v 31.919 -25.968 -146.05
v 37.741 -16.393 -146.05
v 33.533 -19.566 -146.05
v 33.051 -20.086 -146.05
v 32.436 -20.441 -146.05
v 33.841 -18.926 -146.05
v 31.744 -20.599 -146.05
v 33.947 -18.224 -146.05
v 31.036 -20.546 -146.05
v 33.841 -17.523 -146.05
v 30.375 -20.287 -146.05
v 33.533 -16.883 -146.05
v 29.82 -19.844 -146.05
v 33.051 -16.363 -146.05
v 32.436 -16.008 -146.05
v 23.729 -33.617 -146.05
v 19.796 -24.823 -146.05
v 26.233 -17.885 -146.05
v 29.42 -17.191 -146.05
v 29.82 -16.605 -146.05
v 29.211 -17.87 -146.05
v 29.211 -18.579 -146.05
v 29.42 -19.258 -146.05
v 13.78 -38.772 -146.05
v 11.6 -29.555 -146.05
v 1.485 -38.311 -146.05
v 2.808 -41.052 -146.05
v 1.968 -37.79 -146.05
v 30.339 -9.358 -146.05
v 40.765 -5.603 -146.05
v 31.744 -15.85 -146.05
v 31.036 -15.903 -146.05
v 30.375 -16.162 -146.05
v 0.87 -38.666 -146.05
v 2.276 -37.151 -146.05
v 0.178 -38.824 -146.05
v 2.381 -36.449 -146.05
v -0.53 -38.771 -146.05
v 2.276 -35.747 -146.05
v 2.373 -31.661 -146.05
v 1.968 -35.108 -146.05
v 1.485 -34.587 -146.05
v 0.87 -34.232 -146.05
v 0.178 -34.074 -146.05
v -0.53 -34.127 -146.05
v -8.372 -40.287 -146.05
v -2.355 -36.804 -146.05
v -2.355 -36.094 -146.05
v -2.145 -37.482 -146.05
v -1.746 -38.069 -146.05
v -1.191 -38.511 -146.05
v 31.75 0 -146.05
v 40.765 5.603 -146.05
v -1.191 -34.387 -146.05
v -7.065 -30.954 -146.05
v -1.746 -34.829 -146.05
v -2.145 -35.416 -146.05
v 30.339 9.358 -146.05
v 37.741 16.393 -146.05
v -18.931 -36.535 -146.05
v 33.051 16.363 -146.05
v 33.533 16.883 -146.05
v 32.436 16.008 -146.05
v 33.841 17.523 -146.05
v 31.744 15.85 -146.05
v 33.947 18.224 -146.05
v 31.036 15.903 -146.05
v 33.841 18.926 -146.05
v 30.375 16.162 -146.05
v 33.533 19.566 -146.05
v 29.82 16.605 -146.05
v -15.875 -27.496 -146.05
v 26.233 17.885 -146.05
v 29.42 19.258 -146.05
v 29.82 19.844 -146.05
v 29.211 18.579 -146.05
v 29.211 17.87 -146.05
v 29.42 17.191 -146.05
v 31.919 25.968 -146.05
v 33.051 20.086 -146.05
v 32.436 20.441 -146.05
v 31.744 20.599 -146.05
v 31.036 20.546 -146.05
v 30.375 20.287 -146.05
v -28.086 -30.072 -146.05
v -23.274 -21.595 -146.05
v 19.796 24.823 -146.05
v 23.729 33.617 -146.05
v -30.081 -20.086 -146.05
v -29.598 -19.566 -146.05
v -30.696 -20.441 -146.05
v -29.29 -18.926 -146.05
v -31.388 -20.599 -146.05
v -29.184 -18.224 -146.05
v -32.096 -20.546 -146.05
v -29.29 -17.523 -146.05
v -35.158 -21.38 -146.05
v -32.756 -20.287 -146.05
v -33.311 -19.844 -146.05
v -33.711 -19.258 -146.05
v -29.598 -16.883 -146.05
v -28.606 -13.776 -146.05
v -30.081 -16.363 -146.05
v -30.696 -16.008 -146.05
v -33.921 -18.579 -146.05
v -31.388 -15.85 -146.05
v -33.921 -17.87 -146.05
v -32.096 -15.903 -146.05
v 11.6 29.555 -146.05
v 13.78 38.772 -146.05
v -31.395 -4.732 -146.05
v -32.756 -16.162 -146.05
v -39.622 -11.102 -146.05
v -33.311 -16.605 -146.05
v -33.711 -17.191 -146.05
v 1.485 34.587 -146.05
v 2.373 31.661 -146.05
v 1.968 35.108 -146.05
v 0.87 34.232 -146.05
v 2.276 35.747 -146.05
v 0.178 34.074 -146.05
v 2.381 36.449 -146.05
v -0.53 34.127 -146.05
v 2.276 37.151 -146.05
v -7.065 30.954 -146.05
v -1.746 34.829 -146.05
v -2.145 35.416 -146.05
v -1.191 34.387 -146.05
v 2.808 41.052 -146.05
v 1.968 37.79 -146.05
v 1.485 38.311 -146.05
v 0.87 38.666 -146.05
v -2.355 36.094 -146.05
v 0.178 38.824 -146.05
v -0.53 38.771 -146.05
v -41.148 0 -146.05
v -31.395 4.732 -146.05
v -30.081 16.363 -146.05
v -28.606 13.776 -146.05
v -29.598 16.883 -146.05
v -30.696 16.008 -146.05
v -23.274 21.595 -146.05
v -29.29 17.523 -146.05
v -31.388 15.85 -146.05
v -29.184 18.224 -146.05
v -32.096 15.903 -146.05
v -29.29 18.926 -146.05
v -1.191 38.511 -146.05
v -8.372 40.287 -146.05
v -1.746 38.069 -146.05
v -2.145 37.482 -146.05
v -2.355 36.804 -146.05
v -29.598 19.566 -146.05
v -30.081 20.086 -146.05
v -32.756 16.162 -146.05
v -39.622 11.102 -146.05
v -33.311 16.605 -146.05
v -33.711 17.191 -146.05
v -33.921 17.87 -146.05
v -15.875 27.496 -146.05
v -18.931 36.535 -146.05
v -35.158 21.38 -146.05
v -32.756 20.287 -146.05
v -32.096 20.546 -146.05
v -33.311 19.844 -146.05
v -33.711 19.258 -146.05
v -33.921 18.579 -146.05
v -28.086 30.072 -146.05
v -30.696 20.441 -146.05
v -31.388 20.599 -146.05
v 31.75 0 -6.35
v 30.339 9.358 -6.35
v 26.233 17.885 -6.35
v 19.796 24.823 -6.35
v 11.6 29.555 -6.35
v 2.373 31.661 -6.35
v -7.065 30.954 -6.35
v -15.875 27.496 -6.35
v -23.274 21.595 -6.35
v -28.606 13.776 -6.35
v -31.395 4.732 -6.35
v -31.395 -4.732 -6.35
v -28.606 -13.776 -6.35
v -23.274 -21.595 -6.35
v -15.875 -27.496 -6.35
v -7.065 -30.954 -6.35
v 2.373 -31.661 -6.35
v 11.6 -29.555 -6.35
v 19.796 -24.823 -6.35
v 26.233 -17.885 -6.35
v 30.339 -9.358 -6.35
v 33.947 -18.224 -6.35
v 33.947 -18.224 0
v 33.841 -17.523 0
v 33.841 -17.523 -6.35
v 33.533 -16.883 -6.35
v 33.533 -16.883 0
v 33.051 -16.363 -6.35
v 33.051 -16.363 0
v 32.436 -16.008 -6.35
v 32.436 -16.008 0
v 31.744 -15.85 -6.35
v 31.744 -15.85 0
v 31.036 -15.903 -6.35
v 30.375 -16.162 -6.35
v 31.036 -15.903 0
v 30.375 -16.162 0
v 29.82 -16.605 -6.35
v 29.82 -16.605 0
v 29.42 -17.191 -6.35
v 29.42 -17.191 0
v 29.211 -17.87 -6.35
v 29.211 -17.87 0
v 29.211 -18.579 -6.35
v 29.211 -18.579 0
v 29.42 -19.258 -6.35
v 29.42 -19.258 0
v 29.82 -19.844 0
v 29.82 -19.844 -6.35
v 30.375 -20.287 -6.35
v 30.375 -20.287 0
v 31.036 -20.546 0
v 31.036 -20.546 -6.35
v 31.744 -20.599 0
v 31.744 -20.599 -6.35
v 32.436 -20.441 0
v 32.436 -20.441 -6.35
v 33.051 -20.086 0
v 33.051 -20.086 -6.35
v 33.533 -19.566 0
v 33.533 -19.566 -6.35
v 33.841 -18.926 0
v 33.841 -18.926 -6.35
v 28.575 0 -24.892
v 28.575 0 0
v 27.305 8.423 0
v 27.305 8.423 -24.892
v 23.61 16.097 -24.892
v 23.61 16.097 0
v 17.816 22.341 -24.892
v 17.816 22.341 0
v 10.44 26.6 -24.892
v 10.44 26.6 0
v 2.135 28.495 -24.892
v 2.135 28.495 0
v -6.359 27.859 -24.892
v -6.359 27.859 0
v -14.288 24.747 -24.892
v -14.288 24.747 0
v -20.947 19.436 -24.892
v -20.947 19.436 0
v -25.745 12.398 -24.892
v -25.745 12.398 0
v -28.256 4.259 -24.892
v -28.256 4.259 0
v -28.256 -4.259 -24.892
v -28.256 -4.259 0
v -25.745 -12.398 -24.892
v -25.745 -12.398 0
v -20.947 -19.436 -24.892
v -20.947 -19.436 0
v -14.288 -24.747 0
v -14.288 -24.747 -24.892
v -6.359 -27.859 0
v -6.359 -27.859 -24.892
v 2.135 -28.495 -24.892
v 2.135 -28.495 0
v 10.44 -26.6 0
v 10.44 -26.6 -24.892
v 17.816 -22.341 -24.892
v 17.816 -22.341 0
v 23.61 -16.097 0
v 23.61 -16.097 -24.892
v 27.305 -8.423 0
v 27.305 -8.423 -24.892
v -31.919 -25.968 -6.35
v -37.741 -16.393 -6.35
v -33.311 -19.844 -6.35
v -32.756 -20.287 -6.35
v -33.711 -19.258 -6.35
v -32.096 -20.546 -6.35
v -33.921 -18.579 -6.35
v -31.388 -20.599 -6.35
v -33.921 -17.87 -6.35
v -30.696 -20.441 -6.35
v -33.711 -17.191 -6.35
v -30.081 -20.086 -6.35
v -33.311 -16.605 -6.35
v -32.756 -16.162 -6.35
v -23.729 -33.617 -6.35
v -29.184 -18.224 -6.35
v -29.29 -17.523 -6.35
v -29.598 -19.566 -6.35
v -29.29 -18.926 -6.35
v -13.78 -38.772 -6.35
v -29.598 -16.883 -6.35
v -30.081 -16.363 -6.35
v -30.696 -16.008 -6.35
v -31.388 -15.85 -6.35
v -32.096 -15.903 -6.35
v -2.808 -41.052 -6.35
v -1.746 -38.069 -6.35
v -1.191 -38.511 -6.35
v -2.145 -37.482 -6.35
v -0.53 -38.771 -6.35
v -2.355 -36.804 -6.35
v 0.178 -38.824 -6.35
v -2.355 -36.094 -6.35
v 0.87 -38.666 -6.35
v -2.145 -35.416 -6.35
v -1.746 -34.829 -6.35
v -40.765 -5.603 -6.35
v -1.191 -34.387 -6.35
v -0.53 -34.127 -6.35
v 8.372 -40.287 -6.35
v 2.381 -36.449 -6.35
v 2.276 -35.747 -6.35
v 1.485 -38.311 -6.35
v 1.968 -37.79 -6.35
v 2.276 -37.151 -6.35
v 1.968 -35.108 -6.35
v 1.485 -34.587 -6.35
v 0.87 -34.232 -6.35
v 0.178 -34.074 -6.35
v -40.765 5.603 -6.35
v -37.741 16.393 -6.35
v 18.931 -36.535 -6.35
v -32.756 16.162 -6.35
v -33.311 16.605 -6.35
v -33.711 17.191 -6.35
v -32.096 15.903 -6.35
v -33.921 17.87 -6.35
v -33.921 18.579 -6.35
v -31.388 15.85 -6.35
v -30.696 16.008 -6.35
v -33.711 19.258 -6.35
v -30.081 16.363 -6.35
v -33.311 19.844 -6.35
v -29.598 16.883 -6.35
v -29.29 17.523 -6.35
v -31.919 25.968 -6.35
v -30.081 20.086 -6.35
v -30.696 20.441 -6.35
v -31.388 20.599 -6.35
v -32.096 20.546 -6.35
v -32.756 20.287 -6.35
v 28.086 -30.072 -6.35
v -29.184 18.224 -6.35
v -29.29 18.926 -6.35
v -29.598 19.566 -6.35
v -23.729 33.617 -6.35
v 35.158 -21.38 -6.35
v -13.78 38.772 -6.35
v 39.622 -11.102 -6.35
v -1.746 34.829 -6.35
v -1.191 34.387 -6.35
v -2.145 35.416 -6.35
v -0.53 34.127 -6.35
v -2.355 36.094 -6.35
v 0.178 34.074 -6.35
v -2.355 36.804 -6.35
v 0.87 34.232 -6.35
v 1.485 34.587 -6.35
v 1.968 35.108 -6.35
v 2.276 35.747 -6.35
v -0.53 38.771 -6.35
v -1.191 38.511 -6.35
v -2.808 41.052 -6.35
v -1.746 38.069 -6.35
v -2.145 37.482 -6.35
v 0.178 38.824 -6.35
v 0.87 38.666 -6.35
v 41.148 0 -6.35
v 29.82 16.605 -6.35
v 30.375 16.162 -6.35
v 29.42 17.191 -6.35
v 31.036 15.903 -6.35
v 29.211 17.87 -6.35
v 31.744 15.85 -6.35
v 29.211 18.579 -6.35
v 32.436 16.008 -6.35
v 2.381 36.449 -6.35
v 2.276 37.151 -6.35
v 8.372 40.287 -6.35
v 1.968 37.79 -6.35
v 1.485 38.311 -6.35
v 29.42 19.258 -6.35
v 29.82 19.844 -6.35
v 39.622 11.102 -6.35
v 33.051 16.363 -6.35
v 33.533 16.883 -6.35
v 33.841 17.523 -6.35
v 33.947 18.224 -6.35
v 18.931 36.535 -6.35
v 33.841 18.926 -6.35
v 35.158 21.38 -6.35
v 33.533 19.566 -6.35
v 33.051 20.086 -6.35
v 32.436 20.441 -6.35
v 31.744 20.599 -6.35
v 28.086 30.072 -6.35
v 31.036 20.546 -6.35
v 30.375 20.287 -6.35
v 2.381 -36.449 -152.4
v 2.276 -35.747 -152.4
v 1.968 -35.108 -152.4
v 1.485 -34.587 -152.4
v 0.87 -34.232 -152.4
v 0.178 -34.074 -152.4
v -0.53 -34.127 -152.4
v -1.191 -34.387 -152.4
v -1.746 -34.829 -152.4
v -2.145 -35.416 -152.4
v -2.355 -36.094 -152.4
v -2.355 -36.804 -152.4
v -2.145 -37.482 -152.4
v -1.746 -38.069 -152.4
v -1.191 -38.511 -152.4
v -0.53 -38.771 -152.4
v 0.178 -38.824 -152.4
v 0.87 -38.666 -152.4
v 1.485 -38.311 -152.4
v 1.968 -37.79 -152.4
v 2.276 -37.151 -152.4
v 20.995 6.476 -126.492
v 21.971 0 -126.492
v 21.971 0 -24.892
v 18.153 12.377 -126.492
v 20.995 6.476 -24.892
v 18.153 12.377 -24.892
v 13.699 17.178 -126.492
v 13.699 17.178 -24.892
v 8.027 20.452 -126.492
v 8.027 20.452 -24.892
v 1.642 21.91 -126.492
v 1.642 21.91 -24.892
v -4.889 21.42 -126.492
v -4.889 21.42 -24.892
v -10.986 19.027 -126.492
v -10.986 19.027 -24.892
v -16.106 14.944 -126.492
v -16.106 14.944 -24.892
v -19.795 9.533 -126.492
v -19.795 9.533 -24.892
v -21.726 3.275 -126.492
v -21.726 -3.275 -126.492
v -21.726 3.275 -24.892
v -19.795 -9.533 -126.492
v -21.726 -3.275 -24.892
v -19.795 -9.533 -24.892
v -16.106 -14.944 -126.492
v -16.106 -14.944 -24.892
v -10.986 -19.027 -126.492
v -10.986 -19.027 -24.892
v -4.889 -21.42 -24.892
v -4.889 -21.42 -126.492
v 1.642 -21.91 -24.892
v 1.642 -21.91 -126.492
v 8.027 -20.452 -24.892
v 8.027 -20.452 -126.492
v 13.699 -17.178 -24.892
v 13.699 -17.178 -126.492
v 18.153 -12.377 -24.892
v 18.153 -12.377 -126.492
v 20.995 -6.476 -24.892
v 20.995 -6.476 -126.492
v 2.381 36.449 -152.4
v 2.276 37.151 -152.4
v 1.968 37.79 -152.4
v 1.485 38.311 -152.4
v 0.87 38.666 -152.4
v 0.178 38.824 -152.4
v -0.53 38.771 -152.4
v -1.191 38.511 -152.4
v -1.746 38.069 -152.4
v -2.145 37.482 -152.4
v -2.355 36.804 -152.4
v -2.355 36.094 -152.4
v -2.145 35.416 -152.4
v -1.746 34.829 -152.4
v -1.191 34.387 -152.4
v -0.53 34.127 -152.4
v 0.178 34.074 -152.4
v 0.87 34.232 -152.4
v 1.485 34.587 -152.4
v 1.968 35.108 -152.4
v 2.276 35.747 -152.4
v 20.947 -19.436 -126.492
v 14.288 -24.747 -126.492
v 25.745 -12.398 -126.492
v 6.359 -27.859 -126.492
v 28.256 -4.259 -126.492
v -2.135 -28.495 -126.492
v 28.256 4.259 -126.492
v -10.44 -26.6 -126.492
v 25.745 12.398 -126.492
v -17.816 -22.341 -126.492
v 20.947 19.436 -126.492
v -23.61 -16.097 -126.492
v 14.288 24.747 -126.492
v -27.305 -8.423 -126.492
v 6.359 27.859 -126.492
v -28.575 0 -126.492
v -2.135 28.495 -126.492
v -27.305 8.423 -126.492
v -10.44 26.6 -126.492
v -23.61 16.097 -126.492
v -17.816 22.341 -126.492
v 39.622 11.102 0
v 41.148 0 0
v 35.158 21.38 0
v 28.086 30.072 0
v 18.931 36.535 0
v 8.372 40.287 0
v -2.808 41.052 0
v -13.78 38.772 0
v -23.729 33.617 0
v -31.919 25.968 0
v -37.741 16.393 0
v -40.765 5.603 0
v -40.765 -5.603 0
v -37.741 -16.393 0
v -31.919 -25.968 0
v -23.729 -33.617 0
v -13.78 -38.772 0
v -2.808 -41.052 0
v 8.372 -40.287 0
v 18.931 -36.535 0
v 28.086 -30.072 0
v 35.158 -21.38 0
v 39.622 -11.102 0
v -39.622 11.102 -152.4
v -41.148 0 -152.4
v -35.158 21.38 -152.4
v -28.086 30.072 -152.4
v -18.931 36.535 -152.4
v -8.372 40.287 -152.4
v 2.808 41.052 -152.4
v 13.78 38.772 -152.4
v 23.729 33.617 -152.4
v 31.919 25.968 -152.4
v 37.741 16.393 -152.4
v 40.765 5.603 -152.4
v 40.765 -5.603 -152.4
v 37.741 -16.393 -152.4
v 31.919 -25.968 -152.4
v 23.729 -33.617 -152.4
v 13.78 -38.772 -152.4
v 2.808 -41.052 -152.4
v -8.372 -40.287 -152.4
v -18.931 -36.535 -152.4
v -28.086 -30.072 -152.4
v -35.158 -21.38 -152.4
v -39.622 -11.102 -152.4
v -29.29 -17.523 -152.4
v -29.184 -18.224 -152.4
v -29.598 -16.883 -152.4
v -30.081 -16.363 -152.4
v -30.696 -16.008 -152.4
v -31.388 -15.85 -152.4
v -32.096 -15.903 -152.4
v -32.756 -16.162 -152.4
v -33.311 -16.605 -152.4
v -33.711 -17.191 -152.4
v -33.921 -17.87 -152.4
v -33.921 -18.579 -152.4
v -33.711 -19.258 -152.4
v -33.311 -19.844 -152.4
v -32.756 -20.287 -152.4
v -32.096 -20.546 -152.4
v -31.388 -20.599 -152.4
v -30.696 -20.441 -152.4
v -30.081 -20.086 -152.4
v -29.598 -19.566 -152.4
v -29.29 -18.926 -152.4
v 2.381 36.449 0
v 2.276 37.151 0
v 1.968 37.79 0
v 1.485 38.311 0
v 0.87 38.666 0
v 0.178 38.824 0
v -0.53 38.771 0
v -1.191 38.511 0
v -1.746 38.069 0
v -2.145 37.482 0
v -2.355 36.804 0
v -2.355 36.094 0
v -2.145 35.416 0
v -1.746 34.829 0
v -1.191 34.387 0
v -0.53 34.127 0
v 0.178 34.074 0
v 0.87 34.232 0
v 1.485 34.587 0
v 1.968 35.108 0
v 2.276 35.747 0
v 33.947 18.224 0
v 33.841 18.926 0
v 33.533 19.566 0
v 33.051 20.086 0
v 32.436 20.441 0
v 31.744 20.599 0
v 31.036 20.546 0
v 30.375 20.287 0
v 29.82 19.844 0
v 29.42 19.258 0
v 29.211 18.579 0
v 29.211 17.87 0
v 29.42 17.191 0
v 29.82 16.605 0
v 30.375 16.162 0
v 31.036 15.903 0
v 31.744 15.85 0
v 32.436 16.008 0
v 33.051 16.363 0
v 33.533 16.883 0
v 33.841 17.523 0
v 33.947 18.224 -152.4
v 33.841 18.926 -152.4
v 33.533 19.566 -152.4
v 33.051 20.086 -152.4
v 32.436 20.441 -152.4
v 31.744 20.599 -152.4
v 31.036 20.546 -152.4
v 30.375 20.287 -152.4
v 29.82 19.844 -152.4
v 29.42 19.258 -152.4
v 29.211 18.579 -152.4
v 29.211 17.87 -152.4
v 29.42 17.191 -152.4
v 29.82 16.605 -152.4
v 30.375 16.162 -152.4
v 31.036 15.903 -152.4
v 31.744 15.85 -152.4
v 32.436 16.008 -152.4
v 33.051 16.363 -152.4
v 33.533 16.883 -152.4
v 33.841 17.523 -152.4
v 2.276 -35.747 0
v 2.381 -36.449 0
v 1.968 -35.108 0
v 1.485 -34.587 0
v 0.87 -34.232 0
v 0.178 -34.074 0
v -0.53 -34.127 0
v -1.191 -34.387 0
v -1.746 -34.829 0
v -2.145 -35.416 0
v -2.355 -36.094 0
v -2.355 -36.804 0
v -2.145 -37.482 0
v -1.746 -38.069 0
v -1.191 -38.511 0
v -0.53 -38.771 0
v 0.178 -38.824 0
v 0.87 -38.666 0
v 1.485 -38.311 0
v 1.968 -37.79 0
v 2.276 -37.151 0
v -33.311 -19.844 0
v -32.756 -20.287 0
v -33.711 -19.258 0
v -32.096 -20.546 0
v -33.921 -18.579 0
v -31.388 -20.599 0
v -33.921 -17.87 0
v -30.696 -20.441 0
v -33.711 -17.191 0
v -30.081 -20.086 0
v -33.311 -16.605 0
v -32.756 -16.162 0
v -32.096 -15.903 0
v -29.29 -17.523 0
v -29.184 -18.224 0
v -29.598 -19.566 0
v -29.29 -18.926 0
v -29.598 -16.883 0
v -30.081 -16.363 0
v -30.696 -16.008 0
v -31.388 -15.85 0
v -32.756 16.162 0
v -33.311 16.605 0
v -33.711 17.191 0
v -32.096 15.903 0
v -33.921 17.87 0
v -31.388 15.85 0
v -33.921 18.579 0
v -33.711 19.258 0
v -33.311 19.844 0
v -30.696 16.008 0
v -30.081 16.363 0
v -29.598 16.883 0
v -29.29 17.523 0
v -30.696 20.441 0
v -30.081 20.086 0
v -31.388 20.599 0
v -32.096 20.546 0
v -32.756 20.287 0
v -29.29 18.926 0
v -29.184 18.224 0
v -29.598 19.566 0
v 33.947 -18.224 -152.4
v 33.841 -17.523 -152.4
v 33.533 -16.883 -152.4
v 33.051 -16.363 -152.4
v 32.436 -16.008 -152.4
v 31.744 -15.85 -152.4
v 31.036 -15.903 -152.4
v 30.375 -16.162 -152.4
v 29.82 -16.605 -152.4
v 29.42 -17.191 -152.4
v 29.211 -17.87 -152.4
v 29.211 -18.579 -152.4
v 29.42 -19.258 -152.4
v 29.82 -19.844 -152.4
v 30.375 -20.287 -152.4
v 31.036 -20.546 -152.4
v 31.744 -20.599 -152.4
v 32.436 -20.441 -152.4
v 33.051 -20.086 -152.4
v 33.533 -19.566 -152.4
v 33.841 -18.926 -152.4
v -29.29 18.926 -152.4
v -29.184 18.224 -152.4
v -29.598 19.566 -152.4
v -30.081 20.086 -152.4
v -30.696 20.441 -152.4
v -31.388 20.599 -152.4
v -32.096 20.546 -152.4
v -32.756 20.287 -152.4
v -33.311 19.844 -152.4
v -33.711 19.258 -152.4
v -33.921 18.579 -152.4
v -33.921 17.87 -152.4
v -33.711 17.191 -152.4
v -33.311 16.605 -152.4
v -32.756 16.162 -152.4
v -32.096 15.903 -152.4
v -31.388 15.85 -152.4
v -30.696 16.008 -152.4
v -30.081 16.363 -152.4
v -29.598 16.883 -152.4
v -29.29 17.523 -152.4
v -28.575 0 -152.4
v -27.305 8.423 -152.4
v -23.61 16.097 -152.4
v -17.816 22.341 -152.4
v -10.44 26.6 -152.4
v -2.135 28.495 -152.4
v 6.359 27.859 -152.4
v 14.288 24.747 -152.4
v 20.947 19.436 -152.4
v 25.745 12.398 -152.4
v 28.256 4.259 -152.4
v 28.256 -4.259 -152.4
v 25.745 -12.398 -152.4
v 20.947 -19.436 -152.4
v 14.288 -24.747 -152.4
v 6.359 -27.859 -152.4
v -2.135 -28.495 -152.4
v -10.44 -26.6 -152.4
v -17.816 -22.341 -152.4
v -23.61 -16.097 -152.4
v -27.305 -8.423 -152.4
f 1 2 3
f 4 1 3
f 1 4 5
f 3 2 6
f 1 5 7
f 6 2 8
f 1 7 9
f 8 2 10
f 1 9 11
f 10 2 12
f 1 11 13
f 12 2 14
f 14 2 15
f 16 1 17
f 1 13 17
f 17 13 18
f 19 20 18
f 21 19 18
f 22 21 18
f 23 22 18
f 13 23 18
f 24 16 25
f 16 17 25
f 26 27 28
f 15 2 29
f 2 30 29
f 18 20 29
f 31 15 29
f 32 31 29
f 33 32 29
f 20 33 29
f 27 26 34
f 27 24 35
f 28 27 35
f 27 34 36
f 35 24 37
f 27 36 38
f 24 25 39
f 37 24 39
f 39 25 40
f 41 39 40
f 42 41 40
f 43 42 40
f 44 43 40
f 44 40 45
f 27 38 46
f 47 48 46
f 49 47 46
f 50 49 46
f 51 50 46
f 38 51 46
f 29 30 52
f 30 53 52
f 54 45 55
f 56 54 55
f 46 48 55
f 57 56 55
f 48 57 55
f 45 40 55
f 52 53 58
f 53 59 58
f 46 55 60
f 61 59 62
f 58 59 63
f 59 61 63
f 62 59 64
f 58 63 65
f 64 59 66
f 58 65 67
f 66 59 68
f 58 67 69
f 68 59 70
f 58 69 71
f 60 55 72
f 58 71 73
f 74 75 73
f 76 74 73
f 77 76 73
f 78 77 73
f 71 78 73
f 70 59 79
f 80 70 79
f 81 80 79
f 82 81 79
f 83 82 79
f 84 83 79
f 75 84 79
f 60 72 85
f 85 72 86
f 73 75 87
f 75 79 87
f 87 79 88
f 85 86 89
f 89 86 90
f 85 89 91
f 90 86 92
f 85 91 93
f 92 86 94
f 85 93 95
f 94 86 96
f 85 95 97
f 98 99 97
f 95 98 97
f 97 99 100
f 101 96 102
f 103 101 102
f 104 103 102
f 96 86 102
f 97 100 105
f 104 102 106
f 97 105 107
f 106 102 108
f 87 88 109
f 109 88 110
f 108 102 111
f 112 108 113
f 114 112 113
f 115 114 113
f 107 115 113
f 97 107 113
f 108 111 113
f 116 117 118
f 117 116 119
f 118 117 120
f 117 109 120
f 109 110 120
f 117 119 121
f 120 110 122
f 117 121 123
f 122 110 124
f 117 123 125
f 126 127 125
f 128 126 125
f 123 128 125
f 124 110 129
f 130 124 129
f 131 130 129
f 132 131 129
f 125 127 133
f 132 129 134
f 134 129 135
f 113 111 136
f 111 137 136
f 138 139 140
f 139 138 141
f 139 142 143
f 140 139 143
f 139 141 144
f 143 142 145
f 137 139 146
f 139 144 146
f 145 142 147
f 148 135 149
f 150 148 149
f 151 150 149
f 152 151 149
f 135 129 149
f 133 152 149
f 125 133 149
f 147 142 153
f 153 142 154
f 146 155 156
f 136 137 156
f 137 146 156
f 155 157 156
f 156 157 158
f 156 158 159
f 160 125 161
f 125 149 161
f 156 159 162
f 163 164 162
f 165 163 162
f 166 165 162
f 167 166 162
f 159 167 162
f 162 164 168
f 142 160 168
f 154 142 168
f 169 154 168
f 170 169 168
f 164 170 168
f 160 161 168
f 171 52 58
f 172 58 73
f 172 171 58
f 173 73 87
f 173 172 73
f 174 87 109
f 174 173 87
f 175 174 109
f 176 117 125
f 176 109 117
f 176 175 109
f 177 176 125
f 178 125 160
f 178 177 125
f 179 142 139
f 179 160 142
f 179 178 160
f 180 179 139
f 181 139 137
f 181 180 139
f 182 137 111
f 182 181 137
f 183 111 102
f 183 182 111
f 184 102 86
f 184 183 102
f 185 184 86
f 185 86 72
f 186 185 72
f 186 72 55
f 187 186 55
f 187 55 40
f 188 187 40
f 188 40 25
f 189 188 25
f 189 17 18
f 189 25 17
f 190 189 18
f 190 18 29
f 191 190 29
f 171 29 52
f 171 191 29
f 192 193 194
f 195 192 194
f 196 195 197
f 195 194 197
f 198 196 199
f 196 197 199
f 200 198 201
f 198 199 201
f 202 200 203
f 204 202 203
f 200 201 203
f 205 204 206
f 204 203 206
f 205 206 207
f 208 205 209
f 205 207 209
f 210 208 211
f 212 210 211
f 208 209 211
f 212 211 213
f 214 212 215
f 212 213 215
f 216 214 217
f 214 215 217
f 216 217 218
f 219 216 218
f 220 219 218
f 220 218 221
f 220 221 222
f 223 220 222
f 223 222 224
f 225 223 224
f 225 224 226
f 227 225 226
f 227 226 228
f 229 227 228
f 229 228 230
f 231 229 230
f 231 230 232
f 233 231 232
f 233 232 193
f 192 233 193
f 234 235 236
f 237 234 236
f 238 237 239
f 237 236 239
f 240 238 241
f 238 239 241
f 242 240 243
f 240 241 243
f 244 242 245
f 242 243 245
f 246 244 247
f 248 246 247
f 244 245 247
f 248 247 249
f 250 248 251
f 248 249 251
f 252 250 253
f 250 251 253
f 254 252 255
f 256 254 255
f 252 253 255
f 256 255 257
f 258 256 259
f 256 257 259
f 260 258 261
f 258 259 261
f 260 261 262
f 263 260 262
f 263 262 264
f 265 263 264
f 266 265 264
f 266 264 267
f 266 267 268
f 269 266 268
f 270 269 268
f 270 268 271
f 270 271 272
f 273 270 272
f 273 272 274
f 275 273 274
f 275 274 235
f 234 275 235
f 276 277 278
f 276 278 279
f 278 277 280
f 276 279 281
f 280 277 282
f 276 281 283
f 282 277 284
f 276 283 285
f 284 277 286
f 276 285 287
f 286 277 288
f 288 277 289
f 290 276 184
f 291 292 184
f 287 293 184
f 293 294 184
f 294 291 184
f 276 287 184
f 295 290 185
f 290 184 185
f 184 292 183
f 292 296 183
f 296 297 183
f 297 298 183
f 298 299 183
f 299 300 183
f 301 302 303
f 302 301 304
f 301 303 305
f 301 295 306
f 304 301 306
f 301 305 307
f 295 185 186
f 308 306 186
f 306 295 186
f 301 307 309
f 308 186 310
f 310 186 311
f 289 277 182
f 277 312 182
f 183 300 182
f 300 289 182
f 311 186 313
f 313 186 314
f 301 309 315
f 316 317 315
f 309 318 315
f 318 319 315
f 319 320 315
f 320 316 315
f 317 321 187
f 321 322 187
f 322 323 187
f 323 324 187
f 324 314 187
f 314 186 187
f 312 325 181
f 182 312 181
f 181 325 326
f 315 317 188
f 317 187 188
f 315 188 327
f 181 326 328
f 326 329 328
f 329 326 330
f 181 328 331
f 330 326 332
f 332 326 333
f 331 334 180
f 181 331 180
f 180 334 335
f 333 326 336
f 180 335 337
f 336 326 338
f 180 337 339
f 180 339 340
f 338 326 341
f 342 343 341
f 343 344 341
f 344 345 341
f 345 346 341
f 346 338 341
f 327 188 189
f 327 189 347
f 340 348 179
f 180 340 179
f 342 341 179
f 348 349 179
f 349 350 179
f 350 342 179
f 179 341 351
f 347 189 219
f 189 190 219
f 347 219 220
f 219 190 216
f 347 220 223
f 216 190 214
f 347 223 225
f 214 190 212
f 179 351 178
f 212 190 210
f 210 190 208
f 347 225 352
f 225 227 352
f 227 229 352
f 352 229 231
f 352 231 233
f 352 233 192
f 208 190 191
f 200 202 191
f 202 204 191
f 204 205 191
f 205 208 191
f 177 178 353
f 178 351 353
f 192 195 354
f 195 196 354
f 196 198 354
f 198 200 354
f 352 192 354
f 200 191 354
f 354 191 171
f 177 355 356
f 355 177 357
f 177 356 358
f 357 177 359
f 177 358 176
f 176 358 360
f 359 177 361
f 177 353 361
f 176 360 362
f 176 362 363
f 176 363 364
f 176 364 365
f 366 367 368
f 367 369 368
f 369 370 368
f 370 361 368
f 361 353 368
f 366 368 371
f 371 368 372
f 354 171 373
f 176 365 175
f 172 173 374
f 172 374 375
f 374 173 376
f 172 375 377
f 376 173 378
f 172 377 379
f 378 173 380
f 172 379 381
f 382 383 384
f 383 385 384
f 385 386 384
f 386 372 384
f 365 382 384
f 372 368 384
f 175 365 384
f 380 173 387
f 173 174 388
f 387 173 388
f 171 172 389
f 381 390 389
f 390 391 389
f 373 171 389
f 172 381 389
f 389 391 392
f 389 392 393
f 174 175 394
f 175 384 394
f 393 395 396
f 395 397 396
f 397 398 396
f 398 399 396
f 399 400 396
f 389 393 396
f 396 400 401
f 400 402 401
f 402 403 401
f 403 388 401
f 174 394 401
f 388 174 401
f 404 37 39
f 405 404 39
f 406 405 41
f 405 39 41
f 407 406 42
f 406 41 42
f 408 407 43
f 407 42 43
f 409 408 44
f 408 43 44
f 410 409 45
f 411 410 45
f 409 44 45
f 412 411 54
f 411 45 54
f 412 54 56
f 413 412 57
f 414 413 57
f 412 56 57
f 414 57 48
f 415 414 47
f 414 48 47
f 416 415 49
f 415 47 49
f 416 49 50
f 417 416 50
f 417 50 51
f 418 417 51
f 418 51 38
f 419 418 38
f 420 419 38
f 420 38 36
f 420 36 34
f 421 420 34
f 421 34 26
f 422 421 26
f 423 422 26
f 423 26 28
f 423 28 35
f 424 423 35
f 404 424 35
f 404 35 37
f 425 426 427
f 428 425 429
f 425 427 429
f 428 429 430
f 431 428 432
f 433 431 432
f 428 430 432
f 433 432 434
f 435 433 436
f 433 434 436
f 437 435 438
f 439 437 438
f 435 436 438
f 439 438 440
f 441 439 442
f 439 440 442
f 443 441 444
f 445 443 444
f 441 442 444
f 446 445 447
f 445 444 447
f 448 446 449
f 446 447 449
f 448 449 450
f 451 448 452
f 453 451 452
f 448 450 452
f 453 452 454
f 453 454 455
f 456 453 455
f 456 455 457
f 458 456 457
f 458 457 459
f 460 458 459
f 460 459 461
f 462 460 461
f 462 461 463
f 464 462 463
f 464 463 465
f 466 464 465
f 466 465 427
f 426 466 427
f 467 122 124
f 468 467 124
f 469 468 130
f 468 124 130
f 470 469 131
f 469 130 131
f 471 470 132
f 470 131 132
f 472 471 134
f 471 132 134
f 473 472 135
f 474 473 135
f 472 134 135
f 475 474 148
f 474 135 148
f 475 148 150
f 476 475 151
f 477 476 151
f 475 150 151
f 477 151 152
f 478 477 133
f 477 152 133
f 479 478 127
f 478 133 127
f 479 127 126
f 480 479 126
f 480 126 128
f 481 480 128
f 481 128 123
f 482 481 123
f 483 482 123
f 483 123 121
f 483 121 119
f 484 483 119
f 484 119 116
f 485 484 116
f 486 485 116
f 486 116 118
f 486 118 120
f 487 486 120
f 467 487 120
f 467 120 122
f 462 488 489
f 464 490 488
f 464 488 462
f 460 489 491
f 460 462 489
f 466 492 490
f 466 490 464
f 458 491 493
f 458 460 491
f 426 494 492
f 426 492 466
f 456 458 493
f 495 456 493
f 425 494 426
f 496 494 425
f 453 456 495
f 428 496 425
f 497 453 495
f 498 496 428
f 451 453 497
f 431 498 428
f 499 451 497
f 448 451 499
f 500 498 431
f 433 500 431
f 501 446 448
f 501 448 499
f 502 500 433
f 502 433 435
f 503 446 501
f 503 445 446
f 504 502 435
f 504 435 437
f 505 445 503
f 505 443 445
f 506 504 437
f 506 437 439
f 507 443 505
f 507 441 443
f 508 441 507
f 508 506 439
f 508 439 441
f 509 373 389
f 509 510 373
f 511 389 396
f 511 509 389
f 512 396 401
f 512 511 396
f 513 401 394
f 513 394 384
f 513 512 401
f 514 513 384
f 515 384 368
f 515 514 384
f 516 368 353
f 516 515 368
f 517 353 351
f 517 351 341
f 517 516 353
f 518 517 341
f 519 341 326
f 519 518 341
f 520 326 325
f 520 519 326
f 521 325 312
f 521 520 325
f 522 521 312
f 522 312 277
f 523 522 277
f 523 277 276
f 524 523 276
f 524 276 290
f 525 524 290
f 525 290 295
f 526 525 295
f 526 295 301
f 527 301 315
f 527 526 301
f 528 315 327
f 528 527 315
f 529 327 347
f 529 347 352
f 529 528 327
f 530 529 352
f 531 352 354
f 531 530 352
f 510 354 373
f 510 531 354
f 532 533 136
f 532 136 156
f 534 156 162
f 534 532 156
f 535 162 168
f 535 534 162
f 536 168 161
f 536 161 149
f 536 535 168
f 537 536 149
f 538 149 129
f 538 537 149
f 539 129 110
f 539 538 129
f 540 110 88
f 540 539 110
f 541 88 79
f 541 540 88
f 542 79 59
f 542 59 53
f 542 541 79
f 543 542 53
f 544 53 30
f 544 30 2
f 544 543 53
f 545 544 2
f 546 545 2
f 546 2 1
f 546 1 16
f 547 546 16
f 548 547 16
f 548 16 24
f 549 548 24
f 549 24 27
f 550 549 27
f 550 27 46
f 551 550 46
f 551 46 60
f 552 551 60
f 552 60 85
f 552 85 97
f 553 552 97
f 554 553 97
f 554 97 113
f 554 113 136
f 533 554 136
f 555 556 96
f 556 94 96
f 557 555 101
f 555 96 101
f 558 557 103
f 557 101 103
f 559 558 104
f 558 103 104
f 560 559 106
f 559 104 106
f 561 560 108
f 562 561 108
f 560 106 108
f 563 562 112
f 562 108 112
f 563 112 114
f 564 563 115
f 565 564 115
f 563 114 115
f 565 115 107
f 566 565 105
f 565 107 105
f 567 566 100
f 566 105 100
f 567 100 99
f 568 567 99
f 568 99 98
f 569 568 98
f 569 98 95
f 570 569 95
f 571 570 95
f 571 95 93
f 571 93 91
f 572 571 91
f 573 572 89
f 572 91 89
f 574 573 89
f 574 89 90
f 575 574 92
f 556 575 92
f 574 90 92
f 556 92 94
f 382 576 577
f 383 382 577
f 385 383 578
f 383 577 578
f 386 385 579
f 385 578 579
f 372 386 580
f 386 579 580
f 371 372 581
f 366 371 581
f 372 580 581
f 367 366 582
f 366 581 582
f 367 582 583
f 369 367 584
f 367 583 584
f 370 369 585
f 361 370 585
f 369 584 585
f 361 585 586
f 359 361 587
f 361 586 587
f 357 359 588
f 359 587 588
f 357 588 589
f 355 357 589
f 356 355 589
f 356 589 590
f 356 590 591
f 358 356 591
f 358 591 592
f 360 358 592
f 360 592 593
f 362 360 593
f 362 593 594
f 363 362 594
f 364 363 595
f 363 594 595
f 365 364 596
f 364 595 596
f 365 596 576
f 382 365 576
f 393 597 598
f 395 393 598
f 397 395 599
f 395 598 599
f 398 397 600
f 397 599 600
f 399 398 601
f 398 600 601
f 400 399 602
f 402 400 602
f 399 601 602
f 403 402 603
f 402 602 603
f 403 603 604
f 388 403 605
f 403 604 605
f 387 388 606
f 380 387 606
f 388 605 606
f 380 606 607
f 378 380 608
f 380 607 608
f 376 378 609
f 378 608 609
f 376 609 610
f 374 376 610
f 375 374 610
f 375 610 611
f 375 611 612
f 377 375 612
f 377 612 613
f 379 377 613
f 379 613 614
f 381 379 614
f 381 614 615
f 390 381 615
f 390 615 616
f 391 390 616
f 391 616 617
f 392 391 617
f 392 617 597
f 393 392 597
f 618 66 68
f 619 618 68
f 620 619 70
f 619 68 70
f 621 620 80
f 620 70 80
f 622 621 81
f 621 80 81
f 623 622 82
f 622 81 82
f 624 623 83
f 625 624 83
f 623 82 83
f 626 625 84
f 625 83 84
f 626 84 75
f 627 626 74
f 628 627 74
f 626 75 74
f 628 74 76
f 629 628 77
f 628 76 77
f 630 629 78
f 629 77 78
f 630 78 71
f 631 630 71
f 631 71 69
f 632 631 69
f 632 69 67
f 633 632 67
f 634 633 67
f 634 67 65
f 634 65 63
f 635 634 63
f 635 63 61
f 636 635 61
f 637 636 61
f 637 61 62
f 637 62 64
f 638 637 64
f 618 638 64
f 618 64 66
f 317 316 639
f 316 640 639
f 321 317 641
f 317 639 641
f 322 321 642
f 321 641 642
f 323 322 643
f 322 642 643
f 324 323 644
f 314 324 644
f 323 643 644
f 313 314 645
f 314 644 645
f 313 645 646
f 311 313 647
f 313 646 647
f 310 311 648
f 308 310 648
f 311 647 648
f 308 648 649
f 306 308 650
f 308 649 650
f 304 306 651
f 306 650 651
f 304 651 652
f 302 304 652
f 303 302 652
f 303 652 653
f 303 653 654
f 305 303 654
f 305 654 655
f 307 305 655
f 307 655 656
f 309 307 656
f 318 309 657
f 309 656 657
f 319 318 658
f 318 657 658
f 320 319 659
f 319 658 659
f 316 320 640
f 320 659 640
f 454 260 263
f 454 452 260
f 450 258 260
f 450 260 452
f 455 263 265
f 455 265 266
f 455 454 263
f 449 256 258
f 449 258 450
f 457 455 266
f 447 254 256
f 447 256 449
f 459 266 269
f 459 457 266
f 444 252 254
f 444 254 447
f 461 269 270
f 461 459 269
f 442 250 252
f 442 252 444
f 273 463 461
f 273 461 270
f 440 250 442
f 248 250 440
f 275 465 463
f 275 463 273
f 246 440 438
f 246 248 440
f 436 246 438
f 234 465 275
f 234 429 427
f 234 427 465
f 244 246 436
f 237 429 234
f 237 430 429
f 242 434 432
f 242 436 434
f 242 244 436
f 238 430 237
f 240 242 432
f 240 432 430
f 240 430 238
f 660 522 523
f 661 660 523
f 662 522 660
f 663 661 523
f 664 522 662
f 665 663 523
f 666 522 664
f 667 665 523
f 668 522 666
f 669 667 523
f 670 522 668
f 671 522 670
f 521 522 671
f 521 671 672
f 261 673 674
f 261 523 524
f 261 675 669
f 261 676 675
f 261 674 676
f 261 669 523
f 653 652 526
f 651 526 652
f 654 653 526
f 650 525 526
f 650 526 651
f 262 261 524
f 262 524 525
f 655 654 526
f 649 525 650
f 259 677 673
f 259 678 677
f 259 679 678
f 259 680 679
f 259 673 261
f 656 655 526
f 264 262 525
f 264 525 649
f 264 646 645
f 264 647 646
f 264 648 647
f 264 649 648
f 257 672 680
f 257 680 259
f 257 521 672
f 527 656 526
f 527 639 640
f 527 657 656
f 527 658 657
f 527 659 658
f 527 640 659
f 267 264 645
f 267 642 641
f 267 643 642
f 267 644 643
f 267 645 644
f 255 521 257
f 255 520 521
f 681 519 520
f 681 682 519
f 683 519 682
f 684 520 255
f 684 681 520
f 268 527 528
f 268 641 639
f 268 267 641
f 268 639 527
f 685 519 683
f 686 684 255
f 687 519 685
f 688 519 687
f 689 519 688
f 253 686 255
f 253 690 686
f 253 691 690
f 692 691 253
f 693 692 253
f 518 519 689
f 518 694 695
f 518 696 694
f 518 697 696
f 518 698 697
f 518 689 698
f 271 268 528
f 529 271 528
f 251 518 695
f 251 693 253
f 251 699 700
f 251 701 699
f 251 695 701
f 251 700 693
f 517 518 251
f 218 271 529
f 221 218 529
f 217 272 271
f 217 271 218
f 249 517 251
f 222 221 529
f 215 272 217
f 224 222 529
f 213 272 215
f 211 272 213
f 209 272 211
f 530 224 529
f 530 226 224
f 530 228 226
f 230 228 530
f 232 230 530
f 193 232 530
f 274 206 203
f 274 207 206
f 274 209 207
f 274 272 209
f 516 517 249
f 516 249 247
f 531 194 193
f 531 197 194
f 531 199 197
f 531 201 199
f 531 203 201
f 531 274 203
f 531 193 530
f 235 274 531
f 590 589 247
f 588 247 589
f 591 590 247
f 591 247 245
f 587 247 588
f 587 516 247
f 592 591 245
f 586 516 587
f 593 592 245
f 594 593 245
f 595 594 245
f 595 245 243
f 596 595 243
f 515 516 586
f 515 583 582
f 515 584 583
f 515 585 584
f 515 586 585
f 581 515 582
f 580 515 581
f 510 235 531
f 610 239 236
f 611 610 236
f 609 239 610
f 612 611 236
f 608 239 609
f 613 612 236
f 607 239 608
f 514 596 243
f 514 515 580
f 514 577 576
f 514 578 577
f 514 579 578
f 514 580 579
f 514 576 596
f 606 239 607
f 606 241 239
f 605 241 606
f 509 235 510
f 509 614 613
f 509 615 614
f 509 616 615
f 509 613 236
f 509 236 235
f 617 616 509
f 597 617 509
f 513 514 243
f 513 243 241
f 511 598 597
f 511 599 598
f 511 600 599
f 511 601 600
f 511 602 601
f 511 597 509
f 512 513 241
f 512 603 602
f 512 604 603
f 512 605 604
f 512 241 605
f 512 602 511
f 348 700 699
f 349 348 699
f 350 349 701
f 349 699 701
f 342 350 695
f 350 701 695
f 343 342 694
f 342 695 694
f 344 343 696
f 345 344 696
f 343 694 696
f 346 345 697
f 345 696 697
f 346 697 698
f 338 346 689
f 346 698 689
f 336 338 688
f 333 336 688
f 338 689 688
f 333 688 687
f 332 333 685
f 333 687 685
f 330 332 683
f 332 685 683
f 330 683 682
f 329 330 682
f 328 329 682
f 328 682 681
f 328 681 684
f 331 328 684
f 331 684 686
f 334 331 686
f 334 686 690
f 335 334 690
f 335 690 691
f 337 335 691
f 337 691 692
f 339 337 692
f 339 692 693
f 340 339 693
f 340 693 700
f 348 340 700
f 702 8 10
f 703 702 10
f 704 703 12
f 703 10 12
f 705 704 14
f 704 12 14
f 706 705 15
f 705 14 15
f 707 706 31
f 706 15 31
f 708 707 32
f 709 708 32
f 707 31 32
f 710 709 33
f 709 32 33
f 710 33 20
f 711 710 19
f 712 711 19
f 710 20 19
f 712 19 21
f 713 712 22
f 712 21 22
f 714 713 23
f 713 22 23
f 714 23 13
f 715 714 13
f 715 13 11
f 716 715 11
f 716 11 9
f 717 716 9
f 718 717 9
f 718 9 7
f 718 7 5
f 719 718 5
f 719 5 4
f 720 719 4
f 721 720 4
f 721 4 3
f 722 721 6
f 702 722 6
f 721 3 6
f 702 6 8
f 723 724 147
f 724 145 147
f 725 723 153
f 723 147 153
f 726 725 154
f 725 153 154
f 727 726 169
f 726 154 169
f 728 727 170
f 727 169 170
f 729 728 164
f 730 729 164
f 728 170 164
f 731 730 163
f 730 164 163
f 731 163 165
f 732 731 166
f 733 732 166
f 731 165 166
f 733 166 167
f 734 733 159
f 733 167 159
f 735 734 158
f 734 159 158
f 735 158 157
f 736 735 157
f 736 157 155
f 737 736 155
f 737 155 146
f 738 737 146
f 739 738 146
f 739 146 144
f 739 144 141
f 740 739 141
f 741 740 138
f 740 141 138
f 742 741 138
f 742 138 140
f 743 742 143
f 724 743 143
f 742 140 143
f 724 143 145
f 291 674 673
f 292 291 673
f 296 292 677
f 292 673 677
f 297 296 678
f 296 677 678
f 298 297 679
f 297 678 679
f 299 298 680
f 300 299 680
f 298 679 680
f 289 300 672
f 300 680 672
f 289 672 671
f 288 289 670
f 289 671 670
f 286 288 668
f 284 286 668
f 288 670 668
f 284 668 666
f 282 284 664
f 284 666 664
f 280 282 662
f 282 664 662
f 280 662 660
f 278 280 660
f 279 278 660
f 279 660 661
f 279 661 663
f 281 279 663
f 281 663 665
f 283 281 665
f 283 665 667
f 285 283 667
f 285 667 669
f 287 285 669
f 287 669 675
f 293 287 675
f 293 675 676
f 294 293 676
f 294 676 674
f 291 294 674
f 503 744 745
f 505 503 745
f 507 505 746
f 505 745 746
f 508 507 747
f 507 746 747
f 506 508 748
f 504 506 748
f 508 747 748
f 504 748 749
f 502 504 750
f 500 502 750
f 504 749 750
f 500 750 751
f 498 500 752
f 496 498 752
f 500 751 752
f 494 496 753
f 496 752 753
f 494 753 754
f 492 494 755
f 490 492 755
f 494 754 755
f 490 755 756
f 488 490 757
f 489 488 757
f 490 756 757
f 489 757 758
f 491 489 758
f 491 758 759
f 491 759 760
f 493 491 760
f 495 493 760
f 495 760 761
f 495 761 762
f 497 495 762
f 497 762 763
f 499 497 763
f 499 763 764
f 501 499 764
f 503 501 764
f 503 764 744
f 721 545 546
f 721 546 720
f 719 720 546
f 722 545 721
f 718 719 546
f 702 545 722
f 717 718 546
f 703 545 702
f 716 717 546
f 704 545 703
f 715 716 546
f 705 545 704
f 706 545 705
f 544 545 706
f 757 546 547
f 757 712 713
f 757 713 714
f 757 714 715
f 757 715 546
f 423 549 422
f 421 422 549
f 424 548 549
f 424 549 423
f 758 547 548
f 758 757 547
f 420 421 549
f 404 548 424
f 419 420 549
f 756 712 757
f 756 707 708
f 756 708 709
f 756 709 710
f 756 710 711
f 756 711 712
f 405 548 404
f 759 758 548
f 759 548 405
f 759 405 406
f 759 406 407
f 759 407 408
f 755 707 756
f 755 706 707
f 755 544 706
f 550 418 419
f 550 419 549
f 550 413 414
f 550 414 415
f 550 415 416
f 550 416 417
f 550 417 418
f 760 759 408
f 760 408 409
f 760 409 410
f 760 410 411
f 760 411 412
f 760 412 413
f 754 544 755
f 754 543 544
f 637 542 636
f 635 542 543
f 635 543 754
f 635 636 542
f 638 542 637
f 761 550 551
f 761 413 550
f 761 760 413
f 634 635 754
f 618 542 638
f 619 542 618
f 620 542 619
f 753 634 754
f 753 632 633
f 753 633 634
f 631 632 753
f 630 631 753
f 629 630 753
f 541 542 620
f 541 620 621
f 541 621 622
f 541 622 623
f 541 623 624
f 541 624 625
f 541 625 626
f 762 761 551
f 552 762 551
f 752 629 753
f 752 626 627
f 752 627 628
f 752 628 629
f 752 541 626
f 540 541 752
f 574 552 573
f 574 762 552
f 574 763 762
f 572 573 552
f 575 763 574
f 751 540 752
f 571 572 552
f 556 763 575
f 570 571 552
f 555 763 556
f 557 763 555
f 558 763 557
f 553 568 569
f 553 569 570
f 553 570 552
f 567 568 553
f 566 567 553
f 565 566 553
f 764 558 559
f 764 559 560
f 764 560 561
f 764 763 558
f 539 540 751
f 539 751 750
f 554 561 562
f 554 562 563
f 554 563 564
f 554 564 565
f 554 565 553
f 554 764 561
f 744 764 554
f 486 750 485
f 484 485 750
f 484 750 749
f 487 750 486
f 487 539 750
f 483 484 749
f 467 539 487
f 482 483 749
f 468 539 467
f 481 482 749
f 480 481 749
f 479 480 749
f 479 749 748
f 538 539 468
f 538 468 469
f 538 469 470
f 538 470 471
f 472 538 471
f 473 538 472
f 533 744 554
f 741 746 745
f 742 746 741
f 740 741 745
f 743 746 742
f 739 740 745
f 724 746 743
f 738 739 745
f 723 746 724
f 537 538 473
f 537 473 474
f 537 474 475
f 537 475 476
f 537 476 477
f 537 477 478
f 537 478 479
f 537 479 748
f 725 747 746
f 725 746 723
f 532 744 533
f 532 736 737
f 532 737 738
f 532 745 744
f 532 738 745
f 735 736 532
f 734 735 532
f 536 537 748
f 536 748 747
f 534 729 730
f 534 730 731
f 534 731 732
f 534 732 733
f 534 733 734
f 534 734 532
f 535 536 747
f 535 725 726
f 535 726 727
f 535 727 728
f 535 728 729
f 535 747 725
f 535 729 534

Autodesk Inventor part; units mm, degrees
ref_plane "YZ Plane" through (0, 0, 0) normal (1, 0, 0) x (0, 1, 0)
ref_plane "XZ Plane" through (0, 0, 0) normal (0, 1, 0) x (-1, 0, 0)
ref_plane "XY Plane" through (0, 0, 0) normal (0, 0, 1) x (1, 0, 0)
sketch "Sketch1" plane through (0, 0, 0) normal (0, 0, 1) x (1, 0, 0)
  circle A0 centre (0, 0) radius 41.148
  dimension "d0" = 82.296
extrude "Extrusion1" add sketch "Sketch1" against normal blind 152.4
sketch "Sketch2" plane through (0, 0, 0) normal (0, 0, 1) x (1, 0, 0)
  circle A0 centre (0, 0) radius 21.971
  dimension "d3" = 43.942
extrude "Extrusion2" cut sketch "Sketch2" against normal blind 152.4
sketch "Sketch3" plane through (0, 0, 0) normal (0, 0, 1) x (1, 0, 0)
  circle A0 centre (0, 0) radius 28.575
  dimension "d6" = 57.15
extrude "Extrusion3" cut sketch "Sketch3" against normal blind 24.892
sketch "Sketch4" plane through (0, 0, -152.4) normal (0, 0, -1) x (-1, 0, 0)
  circle A0 centre (0, 0) radius 28.575
  dimension "d9" = 57.15
extrude "Extrusion4" cut sketch "Sketch4" against normal blind 25.908
sketch "Sketch5" plane through (0, 0, 0) normal (0, 0, 1) x (1, 0, 0)
  circle A0 centre (0, 0) radius 41.148
  circle A1 centre (0, 0) radius 31.75
  dimension "d12" = 63.5
extrude "Extrusion5" cut sketch "Sketch5" against normal blind 177.8
sketch "Sketch6" plane through (0, 0, 0) normal (0, 0, 1) x (1, 0, 0)
  circle A0 centre (0, 0) radius 31.75
  circle A1 centre (0, 0) radius 41.148
  dimension "d15" = 82.296
extrude "Extrusion6" add sketch "Sketch6" against normal blind 6.35
sketch "Sketch7" plane through (0, 0, -152.4) normal (0, 0, -1) x (-1, 0, 0)
  circle A0 centre (0, 0) radius 31.75
  circle A1 centre (0, 0) radius 31.75 projected
  circle A2 centre (0, 0) radius 41.148
extrude "Extrusion7" add sketch "Sketch7" against normal blind 6.35
sketch "Sketch8" plane through (0, 0, 0) normal (0, 0, 1) x (1, 0, 0)
  circle A0 centre (0, 36.449) radius 2.3813
  circle A1 centre (31.5658, 18.2245) radius 2.3813
  circle A2 centre (31.5658, -18.2245) radius 2.3813
  circle A3 centre (0, -36.449) radius 2.3813
  circle A4 centre (-31.5658, -18.2245) radius 2.3813
  circle A5 centre (-31.5658, 18.2245) radius 2.3813
  point P0 (0, 0)
  dimension "d20" = 4.7625
  dimension "d23" = 360
extrude "Extrusion8" cut sketch "Sketch8" against normal blind 177.8
properties part number "CombustionChamber4_4"
